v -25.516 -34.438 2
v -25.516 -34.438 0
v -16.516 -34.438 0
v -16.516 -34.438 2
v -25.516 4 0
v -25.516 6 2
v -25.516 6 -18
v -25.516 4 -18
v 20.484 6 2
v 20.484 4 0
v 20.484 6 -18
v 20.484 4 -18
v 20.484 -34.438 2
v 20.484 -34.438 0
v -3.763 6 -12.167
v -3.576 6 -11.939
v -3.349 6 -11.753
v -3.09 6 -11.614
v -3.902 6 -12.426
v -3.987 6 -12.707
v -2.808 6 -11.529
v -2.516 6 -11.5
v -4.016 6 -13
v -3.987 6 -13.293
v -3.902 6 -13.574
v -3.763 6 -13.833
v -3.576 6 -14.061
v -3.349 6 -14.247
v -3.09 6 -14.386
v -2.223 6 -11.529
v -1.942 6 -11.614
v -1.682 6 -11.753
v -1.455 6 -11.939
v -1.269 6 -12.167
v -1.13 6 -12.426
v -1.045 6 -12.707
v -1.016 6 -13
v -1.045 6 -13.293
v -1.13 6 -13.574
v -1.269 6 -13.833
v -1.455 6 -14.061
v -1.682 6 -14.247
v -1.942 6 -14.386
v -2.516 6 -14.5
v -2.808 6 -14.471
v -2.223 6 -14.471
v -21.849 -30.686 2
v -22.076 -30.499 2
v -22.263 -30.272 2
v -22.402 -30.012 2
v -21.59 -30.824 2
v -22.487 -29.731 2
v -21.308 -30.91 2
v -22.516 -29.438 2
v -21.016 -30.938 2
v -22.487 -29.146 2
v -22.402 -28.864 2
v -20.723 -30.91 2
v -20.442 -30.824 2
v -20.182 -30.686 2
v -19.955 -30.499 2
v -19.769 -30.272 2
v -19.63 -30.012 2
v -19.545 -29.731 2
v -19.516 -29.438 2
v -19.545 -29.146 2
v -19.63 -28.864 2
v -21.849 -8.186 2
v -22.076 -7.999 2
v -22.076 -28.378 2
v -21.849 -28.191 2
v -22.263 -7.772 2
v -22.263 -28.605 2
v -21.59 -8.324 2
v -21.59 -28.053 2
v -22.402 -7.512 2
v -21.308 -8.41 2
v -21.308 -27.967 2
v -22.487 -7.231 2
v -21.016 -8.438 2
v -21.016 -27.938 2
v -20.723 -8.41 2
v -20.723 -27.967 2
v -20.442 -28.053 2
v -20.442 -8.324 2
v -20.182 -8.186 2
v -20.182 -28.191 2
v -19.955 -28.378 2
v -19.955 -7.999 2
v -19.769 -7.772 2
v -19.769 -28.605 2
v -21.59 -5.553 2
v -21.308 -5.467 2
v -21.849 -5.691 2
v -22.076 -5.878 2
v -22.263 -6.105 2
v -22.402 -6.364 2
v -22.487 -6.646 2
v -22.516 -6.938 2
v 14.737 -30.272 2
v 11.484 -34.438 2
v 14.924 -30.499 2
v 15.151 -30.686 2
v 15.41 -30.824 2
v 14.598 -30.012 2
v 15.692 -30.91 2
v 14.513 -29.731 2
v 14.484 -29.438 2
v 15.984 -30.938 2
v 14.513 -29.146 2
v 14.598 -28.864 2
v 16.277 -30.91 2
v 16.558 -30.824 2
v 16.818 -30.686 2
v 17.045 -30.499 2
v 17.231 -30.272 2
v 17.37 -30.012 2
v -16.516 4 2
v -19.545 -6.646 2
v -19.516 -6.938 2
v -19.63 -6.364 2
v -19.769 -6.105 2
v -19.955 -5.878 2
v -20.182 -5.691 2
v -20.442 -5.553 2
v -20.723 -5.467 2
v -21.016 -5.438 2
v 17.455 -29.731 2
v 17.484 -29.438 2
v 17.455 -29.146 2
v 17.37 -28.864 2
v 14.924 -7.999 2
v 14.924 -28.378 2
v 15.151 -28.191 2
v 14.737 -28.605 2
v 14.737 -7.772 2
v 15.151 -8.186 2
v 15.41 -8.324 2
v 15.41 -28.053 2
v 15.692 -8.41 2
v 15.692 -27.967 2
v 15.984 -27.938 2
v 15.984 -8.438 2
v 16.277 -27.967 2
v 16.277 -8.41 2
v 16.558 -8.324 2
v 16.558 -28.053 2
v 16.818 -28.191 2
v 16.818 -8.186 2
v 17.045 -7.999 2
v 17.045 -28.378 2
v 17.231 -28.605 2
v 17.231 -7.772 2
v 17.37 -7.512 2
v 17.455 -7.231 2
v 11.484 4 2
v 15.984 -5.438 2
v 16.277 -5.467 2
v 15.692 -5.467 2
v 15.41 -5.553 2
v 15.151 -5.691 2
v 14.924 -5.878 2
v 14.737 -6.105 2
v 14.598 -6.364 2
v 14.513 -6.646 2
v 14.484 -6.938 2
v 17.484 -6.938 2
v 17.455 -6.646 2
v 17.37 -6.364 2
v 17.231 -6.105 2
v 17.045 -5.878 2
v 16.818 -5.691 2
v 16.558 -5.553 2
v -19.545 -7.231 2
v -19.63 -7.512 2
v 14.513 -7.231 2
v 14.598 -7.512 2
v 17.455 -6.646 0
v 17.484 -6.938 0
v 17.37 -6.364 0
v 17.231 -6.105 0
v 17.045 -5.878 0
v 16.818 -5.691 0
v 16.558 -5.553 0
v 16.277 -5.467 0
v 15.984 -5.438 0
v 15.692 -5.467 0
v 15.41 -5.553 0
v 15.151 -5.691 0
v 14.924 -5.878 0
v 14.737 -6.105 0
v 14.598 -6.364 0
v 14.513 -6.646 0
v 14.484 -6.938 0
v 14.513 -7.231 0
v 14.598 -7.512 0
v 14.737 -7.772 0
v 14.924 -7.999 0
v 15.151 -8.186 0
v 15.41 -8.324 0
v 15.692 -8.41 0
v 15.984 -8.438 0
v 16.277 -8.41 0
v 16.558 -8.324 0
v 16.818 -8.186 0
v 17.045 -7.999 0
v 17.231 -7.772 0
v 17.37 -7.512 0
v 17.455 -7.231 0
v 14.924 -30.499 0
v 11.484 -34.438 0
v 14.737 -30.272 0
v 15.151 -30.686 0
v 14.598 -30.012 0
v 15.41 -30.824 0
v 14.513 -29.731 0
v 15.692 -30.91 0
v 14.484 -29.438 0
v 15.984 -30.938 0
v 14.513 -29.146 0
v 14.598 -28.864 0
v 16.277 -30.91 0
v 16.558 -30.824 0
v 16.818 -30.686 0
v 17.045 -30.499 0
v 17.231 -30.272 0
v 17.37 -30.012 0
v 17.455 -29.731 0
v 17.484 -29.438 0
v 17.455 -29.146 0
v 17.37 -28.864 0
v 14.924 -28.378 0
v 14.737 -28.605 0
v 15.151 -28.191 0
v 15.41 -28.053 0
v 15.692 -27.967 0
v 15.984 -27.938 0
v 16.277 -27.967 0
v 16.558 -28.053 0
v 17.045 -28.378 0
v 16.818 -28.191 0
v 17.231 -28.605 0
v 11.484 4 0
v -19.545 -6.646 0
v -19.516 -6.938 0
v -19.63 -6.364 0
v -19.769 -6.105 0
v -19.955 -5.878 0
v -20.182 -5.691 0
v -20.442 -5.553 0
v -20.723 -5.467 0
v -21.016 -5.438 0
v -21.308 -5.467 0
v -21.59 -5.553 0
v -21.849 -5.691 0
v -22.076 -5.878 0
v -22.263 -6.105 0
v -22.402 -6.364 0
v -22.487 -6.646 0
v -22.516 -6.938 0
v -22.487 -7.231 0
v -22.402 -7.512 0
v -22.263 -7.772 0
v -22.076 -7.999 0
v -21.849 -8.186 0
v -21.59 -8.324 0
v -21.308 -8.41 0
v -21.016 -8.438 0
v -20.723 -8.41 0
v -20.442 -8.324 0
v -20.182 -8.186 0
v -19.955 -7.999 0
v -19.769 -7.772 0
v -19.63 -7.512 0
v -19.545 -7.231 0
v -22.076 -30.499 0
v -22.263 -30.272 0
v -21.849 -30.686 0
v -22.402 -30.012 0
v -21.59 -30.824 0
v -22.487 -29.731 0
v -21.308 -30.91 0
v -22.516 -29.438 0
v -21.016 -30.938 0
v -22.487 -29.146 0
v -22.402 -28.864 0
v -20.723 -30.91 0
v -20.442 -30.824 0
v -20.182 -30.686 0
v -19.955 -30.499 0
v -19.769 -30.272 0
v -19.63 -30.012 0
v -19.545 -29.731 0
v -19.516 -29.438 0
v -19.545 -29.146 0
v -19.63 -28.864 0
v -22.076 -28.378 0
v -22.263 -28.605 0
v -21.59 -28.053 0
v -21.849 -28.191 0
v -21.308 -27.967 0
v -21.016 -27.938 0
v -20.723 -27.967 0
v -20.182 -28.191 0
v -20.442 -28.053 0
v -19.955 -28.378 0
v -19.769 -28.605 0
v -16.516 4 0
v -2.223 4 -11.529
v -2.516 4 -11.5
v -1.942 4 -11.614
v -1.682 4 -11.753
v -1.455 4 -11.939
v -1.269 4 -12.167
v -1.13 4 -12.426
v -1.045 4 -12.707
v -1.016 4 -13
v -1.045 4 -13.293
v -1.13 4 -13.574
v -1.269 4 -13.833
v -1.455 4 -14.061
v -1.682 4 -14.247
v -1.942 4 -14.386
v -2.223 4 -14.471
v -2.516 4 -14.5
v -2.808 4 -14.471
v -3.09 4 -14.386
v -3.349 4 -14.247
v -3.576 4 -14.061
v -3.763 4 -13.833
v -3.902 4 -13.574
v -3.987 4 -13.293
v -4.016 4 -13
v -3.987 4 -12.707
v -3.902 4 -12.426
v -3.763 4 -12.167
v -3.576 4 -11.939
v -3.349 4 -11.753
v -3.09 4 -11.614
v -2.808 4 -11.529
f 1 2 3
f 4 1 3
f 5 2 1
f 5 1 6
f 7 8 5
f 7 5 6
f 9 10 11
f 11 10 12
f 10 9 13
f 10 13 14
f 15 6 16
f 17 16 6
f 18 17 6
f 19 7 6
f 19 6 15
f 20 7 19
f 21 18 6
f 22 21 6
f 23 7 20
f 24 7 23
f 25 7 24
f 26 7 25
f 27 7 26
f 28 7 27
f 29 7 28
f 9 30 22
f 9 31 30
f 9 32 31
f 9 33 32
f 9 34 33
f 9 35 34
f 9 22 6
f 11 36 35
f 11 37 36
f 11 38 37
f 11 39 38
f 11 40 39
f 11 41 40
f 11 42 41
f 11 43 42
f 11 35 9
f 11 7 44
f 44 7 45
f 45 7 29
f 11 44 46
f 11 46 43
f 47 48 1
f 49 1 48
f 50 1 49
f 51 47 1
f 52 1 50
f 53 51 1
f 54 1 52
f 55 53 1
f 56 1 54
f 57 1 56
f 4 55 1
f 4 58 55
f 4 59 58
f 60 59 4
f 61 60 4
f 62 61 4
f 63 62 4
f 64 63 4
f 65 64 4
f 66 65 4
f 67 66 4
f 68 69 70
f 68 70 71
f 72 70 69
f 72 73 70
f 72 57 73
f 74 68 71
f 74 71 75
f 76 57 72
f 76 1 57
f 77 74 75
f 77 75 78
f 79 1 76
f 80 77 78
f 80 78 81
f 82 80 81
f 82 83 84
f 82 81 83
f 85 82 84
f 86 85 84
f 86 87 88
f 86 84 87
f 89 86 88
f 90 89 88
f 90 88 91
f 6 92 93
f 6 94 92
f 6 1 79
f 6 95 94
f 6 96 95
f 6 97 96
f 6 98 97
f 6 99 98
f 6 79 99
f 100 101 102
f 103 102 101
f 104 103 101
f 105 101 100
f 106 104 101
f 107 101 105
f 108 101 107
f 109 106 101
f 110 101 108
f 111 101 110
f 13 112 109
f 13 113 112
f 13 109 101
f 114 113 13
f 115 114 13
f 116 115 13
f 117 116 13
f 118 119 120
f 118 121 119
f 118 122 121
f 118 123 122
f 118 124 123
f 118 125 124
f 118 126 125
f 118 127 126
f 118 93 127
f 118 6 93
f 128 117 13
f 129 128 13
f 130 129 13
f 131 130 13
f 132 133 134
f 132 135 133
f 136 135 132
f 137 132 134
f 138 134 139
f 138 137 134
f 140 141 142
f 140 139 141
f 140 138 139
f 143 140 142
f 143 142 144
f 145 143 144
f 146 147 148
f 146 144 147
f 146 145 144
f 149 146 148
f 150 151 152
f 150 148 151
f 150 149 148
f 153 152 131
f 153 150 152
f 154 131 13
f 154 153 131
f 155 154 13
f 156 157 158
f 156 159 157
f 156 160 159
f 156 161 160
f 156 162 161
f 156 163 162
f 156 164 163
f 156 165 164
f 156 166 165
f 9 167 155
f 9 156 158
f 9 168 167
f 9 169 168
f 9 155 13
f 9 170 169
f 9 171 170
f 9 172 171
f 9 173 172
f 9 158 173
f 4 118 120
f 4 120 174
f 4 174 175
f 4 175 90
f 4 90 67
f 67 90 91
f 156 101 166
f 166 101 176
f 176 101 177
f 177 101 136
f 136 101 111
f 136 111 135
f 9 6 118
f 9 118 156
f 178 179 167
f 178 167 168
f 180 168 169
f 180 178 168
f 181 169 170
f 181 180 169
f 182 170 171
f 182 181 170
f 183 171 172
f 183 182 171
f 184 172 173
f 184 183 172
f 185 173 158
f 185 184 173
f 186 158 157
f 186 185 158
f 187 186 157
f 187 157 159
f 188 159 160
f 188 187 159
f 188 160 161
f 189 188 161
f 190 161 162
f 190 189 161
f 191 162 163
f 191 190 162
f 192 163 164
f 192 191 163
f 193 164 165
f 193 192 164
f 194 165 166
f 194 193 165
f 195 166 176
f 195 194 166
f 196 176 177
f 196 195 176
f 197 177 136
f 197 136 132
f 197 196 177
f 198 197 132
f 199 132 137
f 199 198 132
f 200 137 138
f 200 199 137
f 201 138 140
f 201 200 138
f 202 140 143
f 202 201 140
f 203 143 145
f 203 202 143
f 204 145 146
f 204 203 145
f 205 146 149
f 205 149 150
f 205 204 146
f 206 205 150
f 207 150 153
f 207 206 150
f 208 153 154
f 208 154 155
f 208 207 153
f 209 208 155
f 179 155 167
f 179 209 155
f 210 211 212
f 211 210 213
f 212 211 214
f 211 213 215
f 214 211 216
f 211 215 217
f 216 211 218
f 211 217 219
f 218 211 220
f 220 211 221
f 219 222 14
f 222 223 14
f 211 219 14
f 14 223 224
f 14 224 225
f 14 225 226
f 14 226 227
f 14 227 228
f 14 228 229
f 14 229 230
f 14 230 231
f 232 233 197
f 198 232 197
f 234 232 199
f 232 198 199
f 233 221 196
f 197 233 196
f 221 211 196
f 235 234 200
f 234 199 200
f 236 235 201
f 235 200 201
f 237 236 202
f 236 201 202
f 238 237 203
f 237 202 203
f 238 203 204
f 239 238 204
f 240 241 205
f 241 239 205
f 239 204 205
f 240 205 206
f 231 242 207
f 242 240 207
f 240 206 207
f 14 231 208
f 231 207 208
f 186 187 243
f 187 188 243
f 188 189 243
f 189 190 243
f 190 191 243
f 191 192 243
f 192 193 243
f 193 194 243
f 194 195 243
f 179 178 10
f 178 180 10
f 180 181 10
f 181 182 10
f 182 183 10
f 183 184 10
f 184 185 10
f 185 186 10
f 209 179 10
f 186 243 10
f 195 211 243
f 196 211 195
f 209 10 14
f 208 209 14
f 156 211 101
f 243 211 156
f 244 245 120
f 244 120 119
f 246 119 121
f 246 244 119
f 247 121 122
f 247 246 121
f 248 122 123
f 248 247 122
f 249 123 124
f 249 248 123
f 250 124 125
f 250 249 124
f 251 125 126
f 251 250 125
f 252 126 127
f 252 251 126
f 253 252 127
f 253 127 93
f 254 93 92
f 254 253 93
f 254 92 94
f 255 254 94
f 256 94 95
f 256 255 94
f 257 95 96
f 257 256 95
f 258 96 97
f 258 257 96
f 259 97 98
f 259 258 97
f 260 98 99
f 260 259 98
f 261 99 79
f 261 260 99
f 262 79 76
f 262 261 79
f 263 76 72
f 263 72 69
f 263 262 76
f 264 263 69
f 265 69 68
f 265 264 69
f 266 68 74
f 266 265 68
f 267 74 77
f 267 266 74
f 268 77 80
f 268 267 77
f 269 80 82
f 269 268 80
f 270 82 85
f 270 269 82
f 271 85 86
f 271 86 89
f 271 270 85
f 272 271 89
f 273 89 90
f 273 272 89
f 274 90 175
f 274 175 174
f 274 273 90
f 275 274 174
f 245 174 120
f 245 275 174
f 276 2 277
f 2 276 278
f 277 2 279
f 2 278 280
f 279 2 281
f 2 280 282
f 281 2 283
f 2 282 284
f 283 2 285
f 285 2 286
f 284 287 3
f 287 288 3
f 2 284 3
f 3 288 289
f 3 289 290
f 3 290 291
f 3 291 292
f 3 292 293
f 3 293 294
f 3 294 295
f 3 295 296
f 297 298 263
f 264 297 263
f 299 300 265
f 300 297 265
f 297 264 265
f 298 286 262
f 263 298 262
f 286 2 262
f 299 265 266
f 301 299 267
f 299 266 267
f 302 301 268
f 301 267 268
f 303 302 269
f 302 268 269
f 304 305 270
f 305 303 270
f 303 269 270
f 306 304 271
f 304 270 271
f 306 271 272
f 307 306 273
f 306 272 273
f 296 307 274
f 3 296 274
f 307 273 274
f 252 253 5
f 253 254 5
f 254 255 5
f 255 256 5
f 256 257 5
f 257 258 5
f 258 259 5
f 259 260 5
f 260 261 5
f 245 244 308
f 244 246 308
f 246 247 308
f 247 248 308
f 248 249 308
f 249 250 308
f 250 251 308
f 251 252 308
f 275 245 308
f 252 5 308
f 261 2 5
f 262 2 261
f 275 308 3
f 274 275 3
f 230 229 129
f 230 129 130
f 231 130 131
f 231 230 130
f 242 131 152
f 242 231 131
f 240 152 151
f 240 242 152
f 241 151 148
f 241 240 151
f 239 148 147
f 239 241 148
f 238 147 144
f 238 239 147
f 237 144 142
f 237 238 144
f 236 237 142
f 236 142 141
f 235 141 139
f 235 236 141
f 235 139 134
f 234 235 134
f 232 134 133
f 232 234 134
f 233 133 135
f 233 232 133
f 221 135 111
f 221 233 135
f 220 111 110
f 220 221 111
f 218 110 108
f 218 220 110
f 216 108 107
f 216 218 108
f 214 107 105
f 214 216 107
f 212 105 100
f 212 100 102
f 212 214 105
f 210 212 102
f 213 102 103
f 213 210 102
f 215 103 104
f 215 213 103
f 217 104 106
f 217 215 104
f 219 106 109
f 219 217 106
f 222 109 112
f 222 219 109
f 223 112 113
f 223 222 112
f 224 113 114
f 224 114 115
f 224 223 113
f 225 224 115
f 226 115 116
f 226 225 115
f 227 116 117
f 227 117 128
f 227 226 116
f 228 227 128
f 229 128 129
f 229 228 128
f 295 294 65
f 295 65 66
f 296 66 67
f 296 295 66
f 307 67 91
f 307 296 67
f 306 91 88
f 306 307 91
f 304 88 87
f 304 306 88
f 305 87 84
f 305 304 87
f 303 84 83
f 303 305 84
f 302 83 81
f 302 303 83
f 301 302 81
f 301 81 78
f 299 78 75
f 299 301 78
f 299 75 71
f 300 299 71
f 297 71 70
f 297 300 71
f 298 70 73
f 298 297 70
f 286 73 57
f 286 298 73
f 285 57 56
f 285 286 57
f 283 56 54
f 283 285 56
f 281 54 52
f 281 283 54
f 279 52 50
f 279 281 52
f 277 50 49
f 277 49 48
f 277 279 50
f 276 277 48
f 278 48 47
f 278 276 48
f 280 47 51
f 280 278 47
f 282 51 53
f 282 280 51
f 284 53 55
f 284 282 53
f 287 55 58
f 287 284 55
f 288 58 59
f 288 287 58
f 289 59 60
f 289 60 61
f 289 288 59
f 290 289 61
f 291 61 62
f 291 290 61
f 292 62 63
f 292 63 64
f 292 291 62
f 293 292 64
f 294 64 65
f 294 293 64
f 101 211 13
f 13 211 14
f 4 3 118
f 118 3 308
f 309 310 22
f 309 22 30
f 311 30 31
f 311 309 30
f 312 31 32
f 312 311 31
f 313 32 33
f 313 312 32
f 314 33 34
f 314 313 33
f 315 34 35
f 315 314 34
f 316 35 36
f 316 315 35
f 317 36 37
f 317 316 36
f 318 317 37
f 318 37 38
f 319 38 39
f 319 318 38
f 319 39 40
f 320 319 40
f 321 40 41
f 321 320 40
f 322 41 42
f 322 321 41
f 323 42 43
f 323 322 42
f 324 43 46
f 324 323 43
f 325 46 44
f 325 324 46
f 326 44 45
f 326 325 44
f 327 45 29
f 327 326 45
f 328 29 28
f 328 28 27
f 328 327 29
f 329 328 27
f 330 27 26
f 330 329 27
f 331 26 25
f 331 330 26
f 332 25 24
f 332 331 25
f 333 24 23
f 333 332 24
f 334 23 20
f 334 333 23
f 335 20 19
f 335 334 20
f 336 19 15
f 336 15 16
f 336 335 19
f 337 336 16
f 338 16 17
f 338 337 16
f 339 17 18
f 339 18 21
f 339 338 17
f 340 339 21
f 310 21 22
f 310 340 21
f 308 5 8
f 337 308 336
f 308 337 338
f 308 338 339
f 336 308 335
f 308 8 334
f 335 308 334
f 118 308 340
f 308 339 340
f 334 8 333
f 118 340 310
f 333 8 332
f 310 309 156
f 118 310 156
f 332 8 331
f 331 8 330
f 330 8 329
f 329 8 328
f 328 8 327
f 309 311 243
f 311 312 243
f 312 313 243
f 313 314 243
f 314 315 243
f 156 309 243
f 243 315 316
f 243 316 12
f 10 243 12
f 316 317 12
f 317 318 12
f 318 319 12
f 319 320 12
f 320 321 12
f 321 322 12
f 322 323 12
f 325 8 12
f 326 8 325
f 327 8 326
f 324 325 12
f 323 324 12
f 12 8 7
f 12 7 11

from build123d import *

# Parameters (mm, degrees)
SKETCH3_W             = 9
SKETCH3_H             = 40
SKETCH3_R             = 1.5
BOSS_EXTRUDE5_DEPTH   = 2
BOSS_EXTRUDE5_2_DEPTH = 2
SKETCH5_W             = 46
SKETCH5_H             = 20
SKETCH5_R             = 1.5
BOSS_EXTRUDE7_DEPTH   = 2


with BuildPart() as part:
    # Sketch3 → Boss-Extrude5 (new body)
    with BuildSketch(Plane.XY):
        with Locations((-21.015808288, -14.438328765)):
            Rectangle(SKETCH3_W, SKETCH3_H)
        with Locations((-21.015808288, -29.438328765)):
            Circle(SKETCH3_R, mode=Mode.SUBTRACT)
        with Locations((-21.015808288, -6.938328765)):
            Circle(SKETCH3_R, mode=Mode.SUBTRACT)
    extrude(amount=BOSS_EXTRUDE5_DEPTH)



with BuildPart() as body_2:
    # Sketch3 → Boss-Extrude5 2 (new body)
    with BuildSketch(Plane.XY):
        with Locations((15.984191712, -14.438328765)):
            Rectangle(SKETCH3_W, SKETCH3_H)
        with Locations((15.984191712, -29.438328765)):
            Circle(SKETCH3_R, mode=Mode.SUBTRACT)
        with Locations((15.984191712, -6.938328765)):
            Circle(SKETCH3_R, mode=Mode.SUBTRACT)
    extrude(amount=BOSS_EXTRUDE5_2_DEPTH)


with BuildPart() as part_1:
    add(part.part)

    add(body_2.part)  # Boss-Extrude7 merges body 2
    # Sketch5 → Boss-Extrude7 (add)
    with BuildSketch(Plane(origin=(0, 4, 0), x_dir=(1, 0, 0), z_dir=(0, 1, 0))):
        with Locations((-2.515808288, 8)):
            Rectangle(SKETCH5_W, SKETCH5_H)
        with Locations(Location((-2.515808288, 13, 0), (0, 0, 270))):
            Circle(SKETCH5_R, mode=Mode.SUBTRACT)
    extrude(amount=BOSS_EXTRUDE7_DEPTH)


solid = part_1.part
